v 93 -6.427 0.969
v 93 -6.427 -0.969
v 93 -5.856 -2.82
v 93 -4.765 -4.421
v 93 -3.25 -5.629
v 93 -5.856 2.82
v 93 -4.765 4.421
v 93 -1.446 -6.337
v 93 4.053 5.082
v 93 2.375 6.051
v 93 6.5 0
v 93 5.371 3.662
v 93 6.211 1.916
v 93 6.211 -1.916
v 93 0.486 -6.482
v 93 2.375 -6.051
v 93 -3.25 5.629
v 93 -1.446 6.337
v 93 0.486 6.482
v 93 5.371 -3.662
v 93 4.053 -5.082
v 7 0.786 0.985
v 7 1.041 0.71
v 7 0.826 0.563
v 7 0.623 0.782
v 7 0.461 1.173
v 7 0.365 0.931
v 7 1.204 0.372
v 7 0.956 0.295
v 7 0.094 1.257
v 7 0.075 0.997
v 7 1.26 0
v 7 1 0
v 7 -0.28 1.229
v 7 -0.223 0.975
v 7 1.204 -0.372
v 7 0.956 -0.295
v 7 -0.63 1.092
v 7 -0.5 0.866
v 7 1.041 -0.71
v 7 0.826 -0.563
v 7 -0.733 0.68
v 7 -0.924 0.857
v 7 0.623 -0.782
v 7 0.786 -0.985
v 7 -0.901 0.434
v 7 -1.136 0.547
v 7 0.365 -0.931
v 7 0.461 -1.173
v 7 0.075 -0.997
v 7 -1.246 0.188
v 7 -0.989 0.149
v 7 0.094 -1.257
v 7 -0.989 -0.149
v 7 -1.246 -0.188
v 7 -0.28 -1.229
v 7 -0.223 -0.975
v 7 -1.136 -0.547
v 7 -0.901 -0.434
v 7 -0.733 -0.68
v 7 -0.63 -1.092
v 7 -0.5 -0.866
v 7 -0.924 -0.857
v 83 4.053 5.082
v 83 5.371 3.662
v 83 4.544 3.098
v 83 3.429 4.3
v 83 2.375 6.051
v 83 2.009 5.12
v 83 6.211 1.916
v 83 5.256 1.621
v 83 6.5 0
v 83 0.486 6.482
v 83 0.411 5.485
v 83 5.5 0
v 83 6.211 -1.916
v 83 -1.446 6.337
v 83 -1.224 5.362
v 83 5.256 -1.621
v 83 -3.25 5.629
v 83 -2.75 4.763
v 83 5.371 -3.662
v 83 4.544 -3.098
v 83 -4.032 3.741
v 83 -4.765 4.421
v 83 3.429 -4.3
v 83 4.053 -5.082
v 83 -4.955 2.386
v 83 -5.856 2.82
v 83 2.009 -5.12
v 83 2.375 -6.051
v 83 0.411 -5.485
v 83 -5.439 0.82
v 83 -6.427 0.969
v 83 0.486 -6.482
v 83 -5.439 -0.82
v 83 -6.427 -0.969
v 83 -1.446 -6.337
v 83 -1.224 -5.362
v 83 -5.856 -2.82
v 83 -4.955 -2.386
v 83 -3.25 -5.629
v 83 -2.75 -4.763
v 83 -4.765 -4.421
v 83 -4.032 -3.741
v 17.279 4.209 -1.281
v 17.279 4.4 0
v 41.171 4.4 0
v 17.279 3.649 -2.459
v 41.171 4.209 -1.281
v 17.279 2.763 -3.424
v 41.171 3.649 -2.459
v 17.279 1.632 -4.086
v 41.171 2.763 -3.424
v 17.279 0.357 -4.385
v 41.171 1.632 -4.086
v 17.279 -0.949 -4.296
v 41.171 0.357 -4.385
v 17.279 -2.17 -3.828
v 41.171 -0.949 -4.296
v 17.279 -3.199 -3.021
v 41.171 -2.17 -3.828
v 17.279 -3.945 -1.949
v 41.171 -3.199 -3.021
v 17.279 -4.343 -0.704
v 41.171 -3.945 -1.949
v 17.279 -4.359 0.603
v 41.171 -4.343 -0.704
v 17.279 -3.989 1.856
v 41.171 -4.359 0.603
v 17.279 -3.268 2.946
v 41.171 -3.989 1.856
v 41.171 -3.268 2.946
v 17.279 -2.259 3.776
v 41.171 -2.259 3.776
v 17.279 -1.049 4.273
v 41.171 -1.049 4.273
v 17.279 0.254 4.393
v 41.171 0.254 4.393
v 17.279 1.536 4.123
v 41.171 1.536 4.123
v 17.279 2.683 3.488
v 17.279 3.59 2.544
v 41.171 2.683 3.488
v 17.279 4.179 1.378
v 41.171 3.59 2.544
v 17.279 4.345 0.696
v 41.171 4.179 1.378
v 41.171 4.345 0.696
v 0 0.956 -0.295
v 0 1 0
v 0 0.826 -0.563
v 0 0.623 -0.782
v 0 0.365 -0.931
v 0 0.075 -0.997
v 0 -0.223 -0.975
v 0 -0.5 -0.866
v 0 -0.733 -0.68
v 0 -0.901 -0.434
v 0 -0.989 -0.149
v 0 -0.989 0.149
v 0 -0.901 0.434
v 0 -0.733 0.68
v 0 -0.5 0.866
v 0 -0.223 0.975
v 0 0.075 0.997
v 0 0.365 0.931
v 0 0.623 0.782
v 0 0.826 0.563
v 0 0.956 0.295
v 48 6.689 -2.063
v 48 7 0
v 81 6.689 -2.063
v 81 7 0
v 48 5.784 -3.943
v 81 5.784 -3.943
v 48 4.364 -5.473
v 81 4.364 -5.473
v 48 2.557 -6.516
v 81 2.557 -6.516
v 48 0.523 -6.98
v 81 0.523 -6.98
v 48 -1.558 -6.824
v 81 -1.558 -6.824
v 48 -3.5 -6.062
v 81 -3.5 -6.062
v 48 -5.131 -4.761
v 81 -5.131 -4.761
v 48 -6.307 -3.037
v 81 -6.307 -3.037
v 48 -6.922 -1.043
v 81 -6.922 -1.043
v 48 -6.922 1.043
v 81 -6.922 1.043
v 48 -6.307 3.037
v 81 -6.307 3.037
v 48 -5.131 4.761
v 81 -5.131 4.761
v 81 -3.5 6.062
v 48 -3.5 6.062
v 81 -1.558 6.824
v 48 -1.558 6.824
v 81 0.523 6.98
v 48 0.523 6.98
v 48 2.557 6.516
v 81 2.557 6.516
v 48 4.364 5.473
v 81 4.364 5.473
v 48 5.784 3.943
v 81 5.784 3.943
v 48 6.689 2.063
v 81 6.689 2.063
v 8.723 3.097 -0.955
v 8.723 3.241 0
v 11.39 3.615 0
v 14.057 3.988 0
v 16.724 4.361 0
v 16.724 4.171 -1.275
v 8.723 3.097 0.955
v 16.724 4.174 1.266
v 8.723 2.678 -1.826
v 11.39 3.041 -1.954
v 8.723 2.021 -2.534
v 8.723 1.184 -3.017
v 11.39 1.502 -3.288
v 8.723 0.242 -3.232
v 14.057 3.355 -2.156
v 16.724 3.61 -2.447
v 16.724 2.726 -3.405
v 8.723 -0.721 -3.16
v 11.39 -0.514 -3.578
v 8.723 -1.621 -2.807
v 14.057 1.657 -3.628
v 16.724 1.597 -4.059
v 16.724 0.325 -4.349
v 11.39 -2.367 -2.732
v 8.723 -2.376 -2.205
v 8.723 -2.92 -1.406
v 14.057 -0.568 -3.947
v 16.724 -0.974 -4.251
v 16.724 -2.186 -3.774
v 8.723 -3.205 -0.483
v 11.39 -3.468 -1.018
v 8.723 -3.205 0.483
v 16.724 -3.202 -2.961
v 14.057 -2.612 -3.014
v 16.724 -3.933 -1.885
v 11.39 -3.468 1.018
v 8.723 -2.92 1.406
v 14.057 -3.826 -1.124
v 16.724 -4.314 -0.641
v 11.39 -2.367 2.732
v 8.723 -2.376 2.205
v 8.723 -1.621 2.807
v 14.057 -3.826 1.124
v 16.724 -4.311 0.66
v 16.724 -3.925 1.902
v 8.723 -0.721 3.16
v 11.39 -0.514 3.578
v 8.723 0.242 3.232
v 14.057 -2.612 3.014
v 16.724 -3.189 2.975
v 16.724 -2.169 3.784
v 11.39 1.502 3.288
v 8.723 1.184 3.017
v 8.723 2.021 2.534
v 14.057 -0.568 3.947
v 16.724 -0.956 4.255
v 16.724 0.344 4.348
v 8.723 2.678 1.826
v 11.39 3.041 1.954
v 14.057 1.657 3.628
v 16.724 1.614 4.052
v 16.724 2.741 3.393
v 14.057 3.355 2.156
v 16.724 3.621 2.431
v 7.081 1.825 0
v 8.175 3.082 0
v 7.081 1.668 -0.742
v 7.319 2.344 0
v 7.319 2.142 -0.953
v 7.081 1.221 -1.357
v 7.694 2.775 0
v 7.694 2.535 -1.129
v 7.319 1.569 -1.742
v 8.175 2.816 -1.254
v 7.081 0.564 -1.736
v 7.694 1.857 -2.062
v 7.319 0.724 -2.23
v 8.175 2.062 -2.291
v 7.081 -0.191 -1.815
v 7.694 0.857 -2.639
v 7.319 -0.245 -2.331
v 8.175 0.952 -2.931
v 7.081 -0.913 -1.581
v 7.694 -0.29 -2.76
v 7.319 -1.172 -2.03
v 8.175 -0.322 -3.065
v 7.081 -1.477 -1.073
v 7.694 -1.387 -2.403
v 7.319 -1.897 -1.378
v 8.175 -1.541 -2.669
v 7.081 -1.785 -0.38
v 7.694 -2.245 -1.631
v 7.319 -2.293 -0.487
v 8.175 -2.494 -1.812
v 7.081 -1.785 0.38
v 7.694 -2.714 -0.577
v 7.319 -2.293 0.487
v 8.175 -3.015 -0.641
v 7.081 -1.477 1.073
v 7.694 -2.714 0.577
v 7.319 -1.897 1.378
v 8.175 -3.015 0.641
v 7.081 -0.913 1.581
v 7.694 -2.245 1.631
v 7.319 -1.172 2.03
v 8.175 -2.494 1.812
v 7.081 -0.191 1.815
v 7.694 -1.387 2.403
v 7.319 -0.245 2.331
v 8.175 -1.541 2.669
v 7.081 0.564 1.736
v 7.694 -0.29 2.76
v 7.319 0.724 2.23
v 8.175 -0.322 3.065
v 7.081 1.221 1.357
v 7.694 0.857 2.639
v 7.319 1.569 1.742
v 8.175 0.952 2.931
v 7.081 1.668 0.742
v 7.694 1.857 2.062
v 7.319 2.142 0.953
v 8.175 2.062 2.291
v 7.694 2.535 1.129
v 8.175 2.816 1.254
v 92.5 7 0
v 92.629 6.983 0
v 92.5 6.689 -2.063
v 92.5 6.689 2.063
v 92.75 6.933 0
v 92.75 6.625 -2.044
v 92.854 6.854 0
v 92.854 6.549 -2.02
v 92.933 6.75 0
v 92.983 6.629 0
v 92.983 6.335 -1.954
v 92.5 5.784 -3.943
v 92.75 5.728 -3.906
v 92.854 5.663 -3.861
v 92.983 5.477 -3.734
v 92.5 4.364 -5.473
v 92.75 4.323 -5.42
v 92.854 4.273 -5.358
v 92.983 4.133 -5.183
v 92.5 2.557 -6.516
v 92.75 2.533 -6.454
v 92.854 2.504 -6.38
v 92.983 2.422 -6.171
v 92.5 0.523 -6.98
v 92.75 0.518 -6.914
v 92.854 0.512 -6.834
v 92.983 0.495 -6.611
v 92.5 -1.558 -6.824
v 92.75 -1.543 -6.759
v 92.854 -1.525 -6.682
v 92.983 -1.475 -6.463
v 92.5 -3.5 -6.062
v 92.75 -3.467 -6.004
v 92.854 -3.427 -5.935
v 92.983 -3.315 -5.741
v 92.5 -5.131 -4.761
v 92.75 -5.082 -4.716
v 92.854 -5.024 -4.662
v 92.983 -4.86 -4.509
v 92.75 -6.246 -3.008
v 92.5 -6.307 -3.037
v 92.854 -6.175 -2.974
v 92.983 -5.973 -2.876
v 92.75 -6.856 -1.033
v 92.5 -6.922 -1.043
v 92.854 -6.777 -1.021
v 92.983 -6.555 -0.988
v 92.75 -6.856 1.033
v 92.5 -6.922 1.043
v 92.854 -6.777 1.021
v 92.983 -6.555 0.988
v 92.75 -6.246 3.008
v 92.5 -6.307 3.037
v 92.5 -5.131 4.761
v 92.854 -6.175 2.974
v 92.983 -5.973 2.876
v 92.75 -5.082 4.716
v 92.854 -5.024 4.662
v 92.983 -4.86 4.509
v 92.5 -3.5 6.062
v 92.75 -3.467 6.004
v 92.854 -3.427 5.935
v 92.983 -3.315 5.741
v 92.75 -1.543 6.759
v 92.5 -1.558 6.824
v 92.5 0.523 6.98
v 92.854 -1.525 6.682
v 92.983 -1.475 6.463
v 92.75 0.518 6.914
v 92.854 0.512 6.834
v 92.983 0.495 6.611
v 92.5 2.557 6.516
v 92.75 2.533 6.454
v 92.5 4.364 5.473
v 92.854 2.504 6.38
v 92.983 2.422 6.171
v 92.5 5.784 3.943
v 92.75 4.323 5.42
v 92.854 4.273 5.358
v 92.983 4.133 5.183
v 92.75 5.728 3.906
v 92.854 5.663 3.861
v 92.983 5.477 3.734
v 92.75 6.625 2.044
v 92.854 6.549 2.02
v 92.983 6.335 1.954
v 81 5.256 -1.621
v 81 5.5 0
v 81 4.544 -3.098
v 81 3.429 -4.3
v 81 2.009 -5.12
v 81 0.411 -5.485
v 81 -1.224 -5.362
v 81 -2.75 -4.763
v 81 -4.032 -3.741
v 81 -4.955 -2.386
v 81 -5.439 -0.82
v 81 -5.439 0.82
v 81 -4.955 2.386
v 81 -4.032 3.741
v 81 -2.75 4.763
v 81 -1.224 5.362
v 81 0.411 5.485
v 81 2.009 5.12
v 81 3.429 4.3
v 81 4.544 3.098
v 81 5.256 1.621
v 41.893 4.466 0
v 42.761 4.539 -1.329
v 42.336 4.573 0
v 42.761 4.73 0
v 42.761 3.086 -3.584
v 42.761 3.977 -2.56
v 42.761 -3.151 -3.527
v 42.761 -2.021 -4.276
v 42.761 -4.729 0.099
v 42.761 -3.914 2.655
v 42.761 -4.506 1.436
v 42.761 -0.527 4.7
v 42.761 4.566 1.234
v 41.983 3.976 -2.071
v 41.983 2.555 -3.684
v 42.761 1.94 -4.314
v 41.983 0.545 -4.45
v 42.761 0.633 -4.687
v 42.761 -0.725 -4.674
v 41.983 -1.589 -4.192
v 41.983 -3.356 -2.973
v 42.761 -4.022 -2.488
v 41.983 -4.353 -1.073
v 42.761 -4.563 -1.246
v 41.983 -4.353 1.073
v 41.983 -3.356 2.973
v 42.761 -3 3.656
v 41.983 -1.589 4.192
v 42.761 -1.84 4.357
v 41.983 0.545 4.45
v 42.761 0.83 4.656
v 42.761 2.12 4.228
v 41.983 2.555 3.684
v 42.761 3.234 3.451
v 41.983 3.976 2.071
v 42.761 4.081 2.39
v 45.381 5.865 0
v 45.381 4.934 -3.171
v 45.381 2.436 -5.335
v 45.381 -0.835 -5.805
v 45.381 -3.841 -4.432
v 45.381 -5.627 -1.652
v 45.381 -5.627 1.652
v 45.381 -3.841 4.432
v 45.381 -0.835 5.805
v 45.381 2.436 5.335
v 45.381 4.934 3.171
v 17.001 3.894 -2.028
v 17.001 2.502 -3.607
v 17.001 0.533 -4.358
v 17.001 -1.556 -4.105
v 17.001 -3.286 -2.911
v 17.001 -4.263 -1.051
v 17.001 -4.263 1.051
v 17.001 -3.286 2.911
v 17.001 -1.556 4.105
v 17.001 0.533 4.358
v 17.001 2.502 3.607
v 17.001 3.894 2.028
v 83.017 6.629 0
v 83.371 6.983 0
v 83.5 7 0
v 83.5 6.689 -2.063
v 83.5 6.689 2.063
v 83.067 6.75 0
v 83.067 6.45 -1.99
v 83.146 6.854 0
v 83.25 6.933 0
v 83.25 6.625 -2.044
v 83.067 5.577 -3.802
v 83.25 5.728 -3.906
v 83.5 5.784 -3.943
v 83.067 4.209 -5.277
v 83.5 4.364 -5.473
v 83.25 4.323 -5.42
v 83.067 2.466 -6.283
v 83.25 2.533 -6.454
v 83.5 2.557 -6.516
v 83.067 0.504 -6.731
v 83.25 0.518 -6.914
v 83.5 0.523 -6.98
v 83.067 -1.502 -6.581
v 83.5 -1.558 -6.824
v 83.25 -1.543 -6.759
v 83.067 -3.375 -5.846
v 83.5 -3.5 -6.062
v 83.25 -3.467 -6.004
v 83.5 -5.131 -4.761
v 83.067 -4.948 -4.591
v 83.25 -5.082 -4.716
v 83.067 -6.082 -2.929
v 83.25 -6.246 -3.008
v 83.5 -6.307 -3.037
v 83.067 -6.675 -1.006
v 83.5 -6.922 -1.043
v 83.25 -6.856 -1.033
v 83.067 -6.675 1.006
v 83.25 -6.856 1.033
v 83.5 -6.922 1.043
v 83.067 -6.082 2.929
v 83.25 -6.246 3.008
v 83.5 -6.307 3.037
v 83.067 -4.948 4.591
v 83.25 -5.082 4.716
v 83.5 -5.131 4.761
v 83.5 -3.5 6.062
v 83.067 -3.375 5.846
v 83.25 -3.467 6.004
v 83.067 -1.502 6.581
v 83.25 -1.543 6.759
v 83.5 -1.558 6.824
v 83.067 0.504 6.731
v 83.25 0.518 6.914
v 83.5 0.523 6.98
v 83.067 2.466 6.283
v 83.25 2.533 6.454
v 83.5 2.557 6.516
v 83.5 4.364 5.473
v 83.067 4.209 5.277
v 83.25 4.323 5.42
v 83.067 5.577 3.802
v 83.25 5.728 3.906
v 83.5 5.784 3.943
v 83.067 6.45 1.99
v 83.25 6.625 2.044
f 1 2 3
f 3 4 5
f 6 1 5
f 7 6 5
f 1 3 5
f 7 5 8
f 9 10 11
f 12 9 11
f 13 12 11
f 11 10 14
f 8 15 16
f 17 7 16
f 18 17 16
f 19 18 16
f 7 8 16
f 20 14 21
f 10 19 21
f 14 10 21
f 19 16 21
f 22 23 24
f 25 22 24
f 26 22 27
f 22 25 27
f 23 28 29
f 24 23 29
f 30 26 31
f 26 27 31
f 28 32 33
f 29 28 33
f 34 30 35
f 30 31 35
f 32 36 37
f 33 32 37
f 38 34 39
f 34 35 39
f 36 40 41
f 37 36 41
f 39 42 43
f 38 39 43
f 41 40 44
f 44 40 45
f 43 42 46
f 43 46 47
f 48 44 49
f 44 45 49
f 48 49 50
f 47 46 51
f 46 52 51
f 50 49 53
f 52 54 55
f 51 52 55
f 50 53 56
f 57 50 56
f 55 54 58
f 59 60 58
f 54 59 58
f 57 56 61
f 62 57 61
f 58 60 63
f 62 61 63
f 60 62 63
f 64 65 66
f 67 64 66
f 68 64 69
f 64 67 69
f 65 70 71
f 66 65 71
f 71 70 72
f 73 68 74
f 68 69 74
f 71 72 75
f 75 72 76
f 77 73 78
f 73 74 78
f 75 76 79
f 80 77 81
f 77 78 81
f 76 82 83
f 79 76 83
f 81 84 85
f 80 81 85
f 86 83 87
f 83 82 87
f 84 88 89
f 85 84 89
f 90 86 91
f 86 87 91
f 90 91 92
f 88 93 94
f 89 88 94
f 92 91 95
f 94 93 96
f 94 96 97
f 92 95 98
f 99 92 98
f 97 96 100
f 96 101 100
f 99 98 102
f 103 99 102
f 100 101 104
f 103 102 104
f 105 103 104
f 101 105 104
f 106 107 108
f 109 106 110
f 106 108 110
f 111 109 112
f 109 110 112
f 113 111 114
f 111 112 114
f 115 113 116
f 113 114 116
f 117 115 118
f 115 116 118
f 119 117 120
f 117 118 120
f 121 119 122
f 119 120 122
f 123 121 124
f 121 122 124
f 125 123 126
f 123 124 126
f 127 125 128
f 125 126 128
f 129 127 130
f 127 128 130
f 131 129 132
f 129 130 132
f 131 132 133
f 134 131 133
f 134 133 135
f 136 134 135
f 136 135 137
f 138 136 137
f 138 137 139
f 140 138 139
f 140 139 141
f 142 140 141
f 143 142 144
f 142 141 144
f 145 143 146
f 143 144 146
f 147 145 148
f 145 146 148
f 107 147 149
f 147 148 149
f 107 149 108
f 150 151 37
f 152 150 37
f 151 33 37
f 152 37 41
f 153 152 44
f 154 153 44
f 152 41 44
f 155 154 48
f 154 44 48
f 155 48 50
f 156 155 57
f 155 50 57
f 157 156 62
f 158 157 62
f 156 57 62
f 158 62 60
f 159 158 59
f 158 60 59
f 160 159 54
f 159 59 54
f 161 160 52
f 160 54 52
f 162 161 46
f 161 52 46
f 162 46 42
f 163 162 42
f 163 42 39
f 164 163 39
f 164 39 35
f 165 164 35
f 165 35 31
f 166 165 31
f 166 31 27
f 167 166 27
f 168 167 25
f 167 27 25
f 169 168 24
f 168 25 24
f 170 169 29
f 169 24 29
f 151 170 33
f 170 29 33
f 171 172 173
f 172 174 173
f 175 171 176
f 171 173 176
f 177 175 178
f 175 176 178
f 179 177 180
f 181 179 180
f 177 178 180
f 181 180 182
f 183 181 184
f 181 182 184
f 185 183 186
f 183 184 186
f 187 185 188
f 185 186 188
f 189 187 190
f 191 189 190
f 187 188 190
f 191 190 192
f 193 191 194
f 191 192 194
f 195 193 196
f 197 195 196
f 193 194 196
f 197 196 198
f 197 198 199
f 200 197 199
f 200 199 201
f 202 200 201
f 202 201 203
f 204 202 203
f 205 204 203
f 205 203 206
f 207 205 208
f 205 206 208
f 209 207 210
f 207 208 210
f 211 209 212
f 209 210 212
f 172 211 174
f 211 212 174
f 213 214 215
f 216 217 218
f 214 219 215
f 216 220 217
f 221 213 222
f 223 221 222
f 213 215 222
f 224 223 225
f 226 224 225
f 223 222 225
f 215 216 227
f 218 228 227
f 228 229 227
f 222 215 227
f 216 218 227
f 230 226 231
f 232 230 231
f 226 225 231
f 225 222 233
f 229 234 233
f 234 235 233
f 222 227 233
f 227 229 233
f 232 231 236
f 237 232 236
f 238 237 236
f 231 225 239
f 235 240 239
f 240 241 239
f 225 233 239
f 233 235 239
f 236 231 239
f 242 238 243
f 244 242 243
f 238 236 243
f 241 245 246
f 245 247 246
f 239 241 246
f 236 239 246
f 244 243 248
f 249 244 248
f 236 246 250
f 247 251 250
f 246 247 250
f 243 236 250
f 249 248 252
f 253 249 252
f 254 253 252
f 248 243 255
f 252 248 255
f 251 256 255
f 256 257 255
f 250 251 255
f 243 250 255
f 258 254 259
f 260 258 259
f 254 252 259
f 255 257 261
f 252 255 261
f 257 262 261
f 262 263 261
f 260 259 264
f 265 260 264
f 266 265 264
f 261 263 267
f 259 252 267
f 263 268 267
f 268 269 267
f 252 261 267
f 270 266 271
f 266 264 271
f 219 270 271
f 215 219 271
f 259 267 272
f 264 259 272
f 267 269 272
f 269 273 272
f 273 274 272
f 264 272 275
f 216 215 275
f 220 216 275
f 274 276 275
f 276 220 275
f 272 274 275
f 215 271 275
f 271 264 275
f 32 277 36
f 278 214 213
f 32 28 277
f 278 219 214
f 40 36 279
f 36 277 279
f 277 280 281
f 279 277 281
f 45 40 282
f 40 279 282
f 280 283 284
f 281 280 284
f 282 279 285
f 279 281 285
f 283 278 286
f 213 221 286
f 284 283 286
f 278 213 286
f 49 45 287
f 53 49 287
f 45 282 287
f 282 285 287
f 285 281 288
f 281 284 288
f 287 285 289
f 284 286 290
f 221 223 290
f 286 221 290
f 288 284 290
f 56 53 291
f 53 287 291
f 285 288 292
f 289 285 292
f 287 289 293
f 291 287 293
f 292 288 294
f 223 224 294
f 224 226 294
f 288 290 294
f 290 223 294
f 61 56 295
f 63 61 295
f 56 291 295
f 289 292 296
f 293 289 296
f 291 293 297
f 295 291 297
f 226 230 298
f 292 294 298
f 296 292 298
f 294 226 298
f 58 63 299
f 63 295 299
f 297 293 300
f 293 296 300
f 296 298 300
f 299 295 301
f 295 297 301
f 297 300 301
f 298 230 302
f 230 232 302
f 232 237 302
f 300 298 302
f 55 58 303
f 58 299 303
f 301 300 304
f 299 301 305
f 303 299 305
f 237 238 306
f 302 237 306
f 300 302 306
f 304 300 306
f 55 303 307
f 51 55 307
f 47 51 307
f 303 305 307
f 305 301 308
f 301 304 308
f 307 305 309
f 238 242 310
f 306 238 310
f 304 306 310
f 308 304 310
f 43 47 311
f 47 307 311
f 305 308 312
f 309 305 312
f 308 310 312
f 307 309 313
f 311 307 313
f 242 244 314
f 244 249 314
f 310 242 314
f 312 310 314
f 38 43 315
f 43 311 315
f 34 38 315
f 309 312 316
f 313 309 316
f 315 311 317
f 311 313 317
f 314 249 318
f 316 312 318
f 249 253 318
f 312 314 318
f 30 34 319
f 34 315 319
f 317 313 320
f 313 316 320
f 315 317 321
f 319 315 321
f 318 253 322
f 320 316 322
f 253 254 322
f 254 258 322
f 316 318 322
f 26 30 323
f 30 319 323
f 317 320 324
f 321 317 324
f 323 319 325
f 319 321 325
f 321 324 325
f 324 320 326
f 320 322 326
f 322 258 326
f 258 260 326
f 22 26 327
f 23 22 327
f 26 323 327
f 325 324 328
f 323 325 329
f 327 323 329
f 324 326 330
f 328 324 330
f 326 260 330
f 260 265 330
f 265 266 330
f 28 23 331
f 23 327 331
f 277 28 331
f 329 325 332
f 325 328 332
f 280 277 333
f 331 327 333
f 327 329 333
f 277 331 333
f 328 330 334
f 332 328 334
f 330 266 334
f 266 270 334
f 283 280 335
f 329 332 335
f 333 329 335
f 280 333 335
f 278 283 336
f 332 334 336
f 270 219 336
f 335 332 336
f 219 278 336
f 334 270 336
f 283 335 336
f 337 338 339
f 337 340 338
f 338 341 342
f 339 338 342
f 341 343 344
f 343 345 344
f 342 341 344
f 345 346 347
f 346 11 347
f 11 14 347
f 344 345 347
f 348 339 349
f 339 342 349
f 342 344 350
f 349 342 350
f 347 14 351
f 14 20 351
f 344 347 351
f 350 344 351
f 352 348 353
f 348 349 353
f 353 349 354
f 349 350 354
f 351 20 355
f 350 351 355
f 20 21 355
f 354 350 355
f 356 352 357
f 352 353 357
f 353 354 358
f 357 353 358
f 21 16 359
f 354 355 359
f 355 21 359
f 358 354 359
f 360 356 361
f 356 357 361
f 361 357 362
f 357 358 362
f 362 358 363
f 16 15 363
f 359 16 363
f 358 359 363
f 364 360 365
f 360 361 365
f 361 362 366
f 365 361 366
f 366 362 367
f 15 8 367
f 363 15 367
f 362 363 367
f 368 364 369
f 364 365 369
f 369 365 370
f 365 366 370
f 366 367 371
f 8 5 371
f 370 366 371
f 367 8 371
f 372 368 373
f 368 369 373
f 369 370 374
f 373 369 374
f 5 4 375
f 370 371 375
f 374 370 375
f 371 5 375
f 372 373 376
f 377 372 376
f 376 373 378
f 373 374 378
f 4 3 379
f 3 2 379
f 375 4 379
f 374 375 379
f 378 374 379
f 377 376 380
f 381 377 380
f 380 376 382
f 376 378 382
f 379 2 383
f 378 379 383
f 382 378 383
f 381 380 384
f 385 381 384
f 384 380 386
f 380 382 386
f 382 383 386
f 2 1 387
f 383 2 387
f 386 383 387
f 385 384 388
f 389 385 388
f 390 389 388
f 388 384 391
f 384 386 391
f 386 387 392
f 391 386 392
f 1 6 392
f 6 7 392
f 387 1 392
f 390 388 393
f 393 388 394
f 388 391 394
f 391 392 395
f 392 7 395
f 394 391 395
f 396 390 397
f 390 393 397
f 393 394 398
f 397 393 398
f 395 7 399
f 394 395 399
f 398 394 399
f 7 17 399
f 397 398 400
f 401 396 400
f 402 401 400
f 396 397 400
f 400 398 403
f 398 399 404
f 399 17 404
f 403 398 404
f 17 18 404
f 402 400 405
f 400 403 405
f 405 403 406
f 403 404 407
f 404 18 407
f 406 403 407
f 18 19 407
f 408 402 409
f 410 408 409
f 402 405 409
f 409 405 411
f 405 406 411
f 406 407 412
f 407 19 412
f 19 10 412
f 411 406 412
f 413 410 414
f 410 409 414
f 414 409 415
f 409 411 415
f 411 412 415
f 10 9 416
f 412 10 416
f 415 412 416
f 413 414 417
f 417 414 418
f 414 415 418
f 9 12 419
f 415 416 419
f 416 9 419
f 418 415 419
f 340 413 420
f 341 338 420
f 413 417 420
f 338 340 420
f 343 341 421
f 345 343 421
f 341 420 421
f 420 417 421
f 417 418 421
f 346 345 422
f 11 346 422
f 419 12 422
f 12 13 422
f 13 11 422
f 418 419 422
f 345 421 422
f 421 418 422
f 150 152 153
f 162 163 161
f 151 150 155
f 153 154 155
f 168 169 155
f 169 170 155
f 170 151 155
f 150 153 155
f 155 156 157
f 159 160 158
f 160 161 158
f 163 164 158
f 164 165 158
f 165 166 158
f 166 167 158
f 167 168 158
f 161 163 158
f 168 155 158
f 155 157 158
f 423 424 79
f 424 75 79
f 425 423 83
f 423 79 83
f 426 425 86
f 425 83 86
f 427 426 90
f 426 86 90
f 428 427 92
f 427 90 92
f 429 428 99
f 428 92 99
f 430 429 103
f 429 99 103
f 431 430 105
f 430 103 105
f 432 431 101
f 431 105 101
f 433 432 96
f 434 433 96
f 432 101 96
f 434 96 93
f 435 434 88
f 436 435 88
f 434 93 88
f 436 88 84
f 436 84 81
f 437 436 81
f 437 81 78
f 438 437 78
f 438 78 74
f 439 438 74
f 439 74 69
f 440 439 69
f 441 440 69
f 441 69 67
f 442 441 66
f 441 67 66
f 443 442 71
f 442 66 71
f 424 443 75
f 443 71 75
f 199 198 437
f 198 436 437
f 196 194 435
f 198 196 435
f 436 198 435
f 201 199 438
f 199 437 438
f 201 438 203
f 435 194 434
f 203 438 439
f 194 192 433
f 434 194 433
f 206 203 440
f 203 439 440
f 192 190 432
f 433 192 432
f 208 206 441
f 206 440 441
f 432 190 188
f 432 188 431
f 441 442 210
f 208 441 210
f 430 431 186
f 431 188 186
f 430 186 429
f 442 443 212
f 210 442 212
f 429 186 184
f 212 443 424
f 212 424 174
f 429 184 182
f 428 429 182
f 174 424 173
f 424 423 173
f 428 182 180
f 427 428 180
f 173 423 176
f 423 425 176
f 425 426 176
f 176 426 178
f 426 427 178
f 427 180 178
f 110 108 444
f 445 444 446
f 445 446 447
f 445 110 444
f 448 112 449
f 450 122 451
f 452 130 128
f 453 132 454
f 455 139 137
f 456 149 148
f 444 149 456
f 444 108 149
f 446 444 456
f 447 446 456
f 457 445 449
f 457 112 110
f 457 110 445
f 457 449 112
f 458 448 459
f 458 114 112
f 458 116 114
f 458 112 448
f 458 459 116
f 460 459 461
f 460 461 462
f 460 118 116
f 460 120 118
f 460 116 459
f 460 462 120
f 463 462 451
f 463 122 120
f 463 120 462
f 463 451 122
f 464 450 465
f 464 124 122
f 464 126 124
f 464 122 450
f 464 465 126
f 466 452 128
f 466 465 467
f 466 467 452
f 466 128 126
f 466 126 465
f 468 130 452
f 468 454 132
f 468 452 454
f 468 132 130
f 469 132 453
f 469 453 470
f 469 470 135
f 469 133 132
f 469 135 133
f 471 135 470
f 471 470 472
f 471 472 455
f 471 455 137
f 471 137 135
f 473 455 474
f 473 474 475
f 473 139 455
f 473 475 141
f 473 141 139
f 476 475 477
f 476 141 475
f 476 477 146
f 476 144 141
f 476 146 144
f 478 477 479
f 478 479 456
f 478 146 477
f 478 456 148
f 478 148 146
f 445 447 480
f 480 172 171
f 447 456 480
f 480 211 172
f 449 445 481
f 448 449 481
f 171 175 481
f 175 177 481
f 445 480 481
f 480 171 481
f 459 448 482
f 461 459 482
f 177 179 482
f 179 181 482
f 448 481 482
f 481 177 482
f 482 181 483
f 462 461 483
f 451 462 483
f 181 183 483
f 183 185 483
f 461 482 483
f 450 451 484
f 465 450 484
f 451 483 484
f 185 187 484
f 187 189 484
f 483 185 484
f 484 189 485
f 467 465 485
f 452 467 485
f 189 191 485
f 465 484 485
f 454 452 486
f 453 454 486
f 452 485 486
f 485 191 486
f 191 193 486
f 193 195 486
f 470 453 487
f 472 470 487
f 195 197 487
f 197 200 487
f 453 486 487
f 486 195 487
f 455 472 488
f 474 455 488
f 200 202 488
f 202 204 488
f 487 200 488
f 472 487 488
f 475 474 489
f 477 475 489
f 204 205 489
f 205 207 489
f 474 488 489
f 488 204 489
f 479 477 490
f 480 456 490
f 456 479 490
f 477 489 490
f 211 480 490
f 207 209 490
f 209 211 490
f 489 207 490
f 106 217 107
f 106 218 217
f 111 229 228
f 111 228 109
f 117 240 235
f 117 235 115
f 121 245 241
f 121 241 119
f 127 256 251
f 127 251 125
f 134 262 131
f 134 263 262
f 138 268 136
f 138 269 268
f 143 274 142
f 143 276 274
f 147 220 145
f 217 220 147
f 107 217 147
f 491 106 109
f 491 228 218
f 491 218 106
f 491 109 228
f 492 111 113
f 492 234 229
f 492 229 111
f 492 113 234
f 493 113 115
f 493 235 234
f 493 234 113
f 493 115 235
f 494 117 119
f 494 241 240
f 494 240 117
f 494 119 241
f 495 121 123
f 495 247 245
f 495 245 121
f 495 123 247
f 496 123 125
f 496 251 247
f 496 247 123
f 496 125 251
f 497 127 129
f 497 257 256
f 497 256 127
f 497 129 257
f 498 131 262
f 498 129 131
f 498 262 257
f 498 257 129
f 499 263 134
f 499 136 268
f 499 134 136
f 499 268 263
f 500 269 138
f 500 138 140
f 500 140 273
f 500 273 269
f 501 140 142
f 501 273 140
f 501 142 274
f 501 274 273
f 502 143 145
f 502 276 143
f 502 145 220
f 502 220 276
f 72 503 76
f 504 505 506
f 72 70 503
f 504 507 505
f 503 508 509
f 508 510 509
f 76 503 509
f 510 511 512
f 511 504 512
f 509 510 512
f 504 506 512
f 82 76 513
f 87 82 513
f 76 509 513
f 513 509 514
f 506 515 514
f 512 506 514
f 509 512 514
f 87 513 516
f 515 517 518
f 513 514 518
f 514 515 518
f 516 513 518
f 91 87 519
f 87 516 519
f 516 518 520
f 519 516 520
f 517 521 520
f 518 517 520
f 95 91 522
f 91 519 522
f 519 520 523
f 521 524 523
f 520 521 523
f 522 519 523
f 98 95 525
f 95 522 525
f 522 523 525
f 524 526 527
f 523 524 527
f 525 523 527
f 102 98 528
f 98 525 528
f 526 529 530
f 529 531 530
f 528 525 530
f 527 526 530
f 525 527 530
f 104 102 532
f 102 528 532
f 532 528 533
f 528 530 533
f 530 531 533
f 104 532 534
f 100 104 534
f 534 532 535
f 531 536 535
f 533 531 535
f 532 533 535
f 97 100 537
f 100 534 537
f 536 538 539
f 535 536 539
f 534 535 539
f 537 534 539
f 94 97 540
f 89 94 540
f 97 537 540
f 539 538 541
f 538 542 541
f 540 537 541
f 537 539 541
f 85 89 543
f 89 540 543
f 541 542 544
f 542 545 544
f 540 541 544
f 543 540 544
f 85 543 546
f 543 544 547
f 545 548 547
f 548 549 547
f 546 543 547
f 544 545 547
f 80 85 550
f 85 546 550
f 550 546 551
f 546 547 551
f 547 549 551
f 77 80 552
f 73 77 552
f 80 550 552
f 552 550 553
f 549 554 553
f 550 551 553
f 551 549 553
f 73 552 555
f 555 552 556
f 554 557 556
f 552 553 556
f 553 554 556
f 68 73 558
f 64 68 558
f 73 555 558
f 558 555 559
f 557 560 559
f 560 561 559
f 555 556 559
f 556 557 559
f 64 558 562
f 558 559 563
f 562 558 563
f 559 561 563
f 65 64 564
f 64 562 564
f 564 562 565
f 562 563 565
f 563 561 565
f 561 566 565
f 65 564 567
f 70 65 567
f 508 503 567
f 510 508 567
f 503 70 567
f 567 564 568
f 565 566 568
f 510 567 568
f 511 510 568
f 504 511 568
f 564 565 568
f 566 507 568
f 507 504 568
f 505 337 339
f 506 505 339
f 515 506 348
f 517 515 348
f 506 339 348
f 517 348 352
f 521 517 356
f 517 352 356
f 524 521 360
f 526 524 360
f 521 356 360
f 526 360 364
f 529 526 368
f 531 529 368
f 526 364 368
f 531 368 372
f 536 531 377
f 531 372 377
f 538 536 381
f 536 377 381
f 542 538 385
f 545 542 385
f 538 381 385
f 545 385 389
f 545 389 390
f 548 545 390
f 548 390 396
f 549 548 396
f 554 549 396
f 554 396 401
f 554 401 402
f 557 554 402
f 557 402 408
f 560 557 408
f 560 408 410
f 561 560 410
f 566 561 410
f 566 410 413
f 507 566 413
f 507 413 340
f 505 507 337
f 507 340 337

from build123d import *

# Parameters (mm, degrees)
FILETE1_R = 2
FILETE2_R = 4
FILETE3_R = 0.5


with BuildPart() as part:
    # Esboço1 → Revolução1 (revolve)
    with BuildSketch(Plane.XY):
        Polygon((0, 0), (0, 1), (7, 1), (7, 3), (17, 4.4), (42, 4.4), (48, 7), (81, 7), (81, 5.5), (83, 5.5), (83, 7), (93, 7), (93, 0), align=None)
    revolve(axis=Axis((93, 0, 0), (-1, 0, 0)))

    # Filete1
    filete1_edges = [part.edges().sort_by_distance(p)[0] for p in [
        (7, -3, 0),
    ]]
    fillet(filete1_edges, radius=FILETE1_R)

    # Filete2
    filete2_edges = [part.edges().sort_by_distance(p)[0] for p in [
        (42, -4.4, 0),
        (17, -4.4, 0),
    ]]
    fillet(filete2_edges, radius=FILETE2_R)

    # Filete3
    filete3_edges = [part.edges().sort_by_distance(p)[0] for p in [
        (93, -7, 0),
        (83, -7, 0),
    ]]
    fillet(filete3_edges, radius=FILETE3_R)


solid = part.part
